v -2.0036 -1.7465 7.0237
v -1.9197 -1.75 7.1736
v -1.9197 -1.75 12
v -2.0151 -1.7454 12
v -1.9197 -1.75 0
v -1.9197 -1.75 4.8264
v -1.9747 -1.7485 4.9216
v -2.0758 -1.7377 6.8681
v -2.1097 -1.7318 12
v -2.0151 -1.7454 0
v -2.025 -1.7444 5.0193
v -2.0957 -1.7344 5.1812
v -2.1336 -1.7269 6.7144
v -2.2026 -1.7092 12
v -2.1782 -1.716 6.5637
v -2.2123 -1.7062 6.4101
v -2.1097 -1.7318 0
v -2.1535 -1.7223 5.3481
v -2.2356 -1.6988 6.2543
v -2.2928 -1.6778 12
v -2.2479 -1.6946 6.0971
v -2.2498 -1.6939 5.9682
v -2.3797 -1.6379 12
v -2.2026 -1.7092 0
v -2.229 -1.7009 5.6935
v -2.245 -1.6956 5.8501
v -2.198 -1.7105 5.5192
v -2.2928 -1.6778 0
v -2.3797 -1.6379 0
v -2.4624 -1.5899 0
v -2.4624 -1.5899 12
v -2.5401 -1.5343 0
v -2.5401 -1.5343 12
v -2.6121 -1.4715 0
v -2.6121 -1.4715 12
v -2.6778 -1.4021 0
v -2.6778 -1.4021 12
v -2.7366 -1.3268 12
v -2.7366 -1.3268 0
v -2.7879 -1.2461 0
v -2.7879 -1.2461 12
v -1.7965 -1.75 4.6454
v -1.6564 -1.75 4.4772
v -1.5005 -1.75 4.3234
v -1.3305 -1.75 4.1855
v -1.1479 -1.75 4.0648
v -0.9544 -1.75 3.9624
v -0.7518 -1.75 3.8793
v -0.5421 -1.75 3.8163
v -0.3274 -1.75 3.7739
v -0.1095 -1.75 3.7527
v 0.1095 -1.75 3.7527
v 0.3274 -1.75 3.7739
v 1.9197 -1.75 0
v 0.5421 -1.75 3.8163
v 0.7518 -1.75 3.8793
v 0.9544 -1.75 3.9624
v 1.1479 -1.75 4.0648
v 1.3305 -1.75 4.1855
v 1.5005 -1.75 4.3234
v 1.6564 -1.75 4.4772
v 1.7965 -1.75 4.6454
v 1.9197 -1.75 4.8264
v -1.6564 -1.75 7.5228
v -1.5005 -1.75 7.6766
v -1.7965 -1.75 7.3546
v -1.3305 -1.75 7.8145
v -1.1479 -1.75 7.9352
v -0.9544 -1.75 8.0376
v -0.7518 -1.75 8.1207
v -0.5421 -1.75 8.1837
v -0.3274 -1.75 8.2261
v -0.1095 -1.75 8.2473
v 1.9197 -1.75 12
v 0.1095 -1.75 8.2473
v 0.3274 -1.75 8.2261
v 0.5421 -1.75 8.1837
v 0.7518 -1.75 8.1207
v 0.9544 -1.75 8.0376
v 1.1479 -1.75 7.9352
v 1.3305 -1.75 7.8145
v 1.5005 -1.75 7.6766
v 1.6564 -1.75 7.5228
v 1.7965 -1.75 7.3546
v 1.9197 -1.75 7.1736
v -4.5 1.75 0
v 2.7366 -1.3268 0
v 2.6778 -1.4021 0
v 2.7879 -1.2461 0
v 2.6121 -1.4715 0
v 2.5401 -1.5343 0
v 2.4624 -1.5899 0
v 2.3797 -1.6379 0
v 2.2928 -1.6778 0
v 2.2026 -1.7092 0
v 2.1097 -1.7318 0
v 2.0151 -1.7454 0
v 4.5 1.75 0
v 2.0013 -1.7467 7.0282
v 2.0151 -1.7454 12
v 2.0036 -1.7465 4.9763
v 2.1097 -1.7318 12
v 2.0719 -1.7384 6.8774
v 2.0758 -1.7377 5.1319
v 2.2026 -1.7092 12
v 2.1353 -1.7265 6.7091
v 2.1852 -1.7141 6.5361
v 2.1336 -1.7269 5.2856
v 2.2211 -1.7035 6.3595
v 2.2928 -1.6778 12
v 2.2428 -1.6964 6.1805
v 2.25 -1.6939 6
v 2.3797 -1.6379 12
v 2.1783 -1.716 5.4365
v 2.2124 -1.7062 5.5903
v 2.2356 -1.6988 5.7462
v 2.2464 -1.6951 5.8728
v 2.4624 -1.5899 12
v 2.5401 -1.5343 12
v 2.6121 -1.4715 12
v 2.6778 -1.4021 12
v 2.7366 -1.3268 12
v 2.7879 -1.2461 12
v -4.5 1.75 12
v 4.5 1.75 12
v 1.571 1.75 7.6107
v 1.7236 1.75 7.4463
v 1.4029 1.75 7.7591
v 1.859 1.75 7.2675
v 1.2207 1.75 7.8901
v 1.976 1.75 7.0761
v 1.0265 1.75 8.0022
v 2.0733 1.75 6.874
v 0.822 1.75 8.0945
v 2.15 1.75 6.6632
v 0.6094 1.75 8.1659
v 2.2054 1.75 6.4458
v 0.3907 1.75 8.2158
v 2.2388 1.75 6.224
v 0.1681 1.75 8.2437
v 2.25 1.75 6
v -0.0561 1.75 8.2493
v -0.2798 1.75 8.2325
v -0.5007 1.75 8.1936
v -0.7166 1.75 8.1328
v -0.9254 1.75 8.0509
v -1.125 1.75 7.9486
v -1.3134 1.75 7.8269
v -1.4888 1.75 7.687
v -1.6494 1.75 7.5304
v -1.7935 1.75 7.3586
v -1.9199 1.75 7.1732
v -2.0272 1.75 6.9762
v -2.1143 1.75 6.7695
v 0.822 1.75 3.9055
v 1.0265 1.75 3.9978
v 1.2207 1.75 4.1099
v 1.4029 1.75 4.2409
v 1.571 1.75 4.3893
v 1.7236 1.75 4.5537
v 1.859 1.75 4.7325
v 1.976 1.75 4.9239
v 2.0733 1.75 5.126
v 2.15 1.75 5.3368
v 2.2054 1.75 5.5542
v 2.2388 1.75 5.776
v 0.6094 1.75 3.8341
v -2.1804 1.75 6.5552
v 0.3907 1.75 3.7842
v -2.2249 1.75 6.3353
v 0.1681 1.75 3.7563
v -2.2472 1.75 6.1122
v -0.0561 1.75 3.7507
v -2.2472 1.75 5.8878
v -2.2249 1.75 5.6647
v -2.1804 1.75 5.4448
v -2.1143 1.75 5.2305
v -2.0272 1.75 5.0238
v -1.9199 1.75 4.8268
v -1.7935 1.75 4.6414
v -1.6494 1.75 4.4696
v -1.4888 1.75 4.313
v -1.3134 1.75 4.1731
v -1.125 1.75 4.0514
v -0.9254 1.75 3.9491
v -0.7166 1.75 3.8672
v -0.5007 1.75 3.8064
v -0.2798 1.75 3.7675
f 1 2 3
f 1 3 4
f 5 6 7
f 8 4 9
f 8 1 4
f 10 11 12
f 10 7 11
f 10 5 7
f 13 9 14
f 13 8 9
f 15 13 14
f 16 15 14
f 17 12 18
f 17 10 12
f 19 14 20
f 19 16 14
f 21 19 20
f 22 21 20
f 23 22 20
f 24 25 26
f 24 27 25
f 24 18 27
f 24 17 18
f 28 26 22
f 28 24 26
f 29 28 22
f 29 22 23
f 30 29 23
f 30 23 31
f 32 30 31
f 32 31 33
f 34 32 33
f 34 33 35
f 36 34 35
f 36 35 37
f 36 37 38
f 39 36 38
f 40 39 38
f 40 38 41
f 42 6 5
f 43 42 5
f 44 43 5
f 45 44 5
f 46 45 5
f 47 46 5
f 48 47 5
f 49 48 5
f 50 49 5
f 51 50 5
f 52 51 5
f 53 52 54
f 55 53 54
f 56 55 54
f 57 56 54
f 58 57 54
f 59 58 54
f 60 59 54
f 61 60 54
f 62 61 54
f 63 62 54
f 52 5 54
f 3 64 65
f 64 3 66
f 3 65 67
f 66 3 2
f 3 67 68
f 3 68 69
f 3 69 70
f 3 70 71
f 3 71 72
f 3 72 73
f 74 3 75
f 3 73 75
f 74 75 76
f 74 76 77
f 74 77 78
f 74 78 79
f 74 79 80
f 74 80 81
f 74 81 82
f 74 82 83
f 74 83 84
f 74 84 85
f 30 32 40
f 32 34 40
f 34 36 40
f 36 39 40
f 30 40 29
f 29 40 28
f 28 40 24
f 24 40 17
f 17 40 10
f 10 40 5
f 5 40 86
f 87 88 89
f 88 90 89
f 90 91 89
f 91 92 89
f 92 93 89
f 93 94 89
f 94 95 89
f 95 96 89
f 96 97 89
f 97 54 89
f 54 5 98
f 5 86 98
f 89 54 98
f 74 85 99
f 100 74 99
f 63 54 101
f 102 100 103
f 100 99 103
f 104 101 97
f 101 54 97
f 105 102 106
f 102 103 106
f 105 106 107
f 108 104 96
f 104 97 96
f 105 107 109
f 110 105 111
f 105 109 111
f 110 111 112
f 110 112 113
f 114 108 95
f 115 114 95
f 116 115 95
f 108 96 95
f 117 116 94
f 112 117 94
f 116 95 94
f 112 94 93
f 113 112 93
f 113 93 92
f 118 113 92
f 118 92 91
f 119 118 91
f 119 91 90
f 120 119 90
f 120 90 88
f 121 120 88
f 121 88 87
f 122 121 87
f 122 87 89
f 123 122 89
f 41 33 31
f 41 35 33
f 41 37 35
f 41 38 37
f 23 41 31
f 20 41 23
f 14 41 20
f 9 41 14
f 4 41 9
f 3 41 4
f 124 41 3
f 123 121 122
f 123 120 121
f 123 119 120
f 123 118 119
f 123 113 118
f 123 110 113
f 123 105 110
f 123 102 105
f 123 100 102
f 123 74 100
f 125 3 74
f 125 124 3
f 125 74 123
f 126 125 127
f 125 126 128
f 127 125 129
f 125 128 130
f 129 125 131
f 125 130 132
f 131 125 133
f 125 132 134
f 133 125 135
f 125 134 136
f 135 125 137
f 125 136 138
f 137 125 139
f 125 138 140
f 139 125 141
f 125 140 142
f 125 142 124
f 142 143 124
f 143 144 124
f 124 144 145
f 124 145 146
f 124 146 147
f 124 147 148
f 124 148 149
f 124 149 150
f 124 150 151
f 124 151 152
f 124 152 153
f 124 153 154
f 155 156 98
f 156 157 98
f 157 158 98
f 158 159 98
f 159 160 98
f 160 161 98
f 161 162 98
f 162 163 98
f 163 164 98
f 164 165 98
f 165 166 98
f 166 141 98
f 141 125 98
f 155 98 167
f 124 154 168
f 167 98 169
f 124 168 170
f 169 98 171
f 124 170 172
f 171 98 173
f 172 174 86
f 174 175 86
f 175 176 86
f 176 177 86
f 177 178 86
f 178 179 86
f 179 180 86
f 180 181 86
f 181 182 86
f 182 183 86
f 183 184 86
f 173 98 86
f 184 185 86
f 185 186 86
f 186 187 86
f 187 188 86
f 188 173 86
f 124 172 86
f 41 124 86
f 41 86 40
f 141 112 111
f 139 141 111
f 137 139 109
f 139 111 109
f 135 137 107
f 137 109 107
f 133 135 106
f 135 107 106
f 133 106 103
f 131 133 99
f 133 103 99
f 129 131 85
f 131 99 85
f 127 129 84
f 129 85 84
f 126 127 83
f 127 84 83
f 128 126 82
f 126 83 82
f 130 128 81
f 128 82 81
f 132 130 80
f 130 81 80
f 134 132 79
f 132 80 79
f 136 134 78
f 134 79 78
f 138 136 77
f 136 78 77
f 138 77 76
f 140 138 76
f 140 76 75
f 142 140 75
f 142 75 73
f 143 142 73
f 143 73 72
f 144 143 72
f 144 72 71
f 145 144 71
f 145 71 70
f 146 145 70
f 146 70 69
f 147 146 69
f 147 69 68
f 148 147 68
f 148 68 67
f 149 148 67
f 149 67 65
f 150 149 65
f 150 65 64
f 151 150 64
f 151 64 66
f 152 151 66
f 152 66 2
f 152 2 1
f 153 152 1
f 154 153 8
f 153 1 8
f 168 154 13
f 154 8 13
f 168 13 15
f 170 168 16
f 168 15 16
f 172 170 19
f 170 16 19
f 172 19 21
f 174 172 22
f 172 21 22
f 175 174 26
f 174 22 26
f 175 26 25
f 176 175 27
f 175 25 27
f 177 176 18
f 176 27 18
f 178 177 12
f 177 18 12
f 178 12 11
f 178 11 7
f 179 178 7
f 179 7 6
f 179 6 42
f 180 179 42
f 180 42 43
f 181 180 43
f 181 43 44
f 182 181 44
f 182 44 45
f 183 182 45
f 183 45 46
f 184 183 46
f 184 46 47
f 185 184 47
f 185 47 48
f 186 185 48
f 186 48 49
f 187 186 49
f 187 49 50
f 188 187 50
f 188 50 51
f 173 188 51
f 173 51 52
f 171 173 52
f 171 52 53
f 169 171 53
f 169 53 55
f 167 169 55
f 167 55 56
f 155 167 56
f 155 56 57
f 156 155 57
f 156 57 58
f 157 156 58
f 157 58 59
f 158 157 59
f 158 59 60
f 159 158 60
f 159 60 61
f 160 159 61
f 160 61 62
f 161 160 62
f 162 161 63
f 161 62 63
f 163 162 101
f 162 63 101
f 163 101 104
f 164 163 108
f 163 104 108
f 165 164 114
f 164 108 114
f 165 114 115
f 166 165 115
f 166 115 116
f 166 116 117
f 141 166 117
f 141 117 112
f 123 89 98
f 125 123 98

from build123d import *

# Parameters (mm, degrees)
F1_DEPTH    = 12
F3_D        = 4.5
F4_T1_DEPTH = 14.9016126774


# Not quite as in the source:
# - a fillet or chamfer that OpenCascade refuses, or shapes differently, is made with other operations: its cross-section is extruded or revolved along the edge and cut away or added


with BuildPart() as f1:
    # F0 (on Top) → F1 (new body)
    with BuildSketch(Plane.XY):
        Polygon((-2.5, -1.75), (2.5, -1.75), (4.5, 1.75), (-4.5, 1.75), align=None)
    extrude(amount=F1_DEPTH)

    # F3 (through all)
    with Locations(Plane(origin=(0, 1.75, 0), x_dir=(-1, 0, 0), z_dir=(0, 1, 0))):
        with Locations((0, 6)):
            Hole(F3_D / 2)

    # F4: fillet of radius 1 on 2 edges, made by hand

    # F4_s2 → F4_t1 (cut)
    with BuildSketch(Plane.XY.offset(-1.4508063387)):
        with BuildLine():
            ThreePointArc((1.9196774645, -1.75), (2.4216042827, -1.6149100931), (2.7879206067, -1.2461389384))
            Line((2.7879206067, -1.2461389384), (2.5, -1.75))
            Line((2.5, -1.75), (1.9196774645, -1.75))
        make_face()
        with BuildLine():
            ThreePointArc((-1.9196774645, -1.75), (-2.4216042827, -1.6149100931), (-2.7879206067, -1.2461389384))
            Line((-2.7879206067, -1.2461389384), (-2.5, -1.75))
            Line((-2.5, -1.75), (-1.9196774645, -1.75))
        make_face()
    extrude(amount=F4_T1_DEPTH, mode=Mode.SUBTRACT)


solid = f1.part
